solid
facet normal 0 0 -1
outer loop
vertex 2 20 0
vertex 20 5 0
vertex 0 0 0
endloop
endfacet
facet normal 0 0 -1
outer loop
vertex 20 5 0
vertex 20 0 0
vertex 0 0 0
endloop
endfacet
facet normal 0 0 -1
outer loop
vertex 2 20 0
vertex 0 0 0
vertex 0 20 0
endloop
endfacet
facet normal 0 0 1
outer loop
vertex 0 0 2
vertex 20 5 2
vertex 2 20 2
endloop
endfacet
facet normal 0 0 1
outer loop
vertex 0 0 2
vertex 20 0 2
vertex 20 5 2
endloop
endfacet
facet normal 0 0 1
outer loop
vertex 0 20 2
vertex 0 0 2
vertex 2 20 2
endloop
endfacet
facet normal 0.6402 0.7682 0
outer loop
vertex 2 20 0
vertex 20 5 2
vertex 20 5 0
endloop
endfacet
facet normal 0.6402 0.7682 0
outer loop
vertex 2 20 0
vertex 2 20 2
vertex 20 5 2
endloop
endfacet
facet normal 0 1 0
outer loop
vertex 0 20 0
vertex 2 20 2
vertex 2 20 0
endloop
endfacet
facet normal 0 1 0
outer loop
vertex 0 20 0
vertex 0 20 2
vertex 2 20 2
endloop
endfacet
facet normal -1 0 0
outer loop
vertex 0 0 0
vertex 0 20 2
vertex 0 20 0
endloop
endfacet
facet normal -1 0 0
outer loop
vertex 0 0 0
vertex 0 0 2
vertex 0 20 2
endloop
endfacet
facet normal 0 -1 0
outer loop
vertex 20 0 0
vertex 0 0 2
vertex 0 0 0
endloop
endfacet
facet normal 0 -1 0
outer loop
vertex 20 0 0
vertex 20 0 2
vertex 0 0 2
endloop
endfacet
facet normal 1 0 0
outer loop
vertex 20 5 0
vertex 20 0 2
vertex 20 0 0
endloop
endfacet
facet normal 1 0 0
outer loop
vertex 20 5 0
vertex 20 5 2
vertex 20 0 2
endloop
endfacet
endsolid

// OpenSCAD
$fn=50;

version = "1.1.0";

width = 112; // the horizontal dimension of the face (X)
height = 10; // the vertical dimension of the face (Z)
depth = 20;  // (Y)
inset = 22;
shellThickness = 2;


keyRadius = 2;
keyHeight = 4;

translate([])
topCorner();

%difference() {   
union() {
// top
translate([0,0, height - shellThickness]) 
    cube ([width, 5, shellThickness]);

// side
//translate([0,0, height-depth]) 
cube ([ shellThickness, depth, height]);

// side
translate([width-shellThickness,0, 0]) 
cube ([ shellThickness, depth, height]);

//face
rotate([90, 0,0])
translate([0, 0, -shellThickness]) 
cube ([width, height, shellThickness]);
}


translate([22, -1, keyHeight-1]) keyhole();
translate([width-22, -1, keyHeight-1]) keyhole();
versionNumber();
}


module topCorner() {
    linear_extrude(shellThickness)
    polygon (
            [
                [0,0],
                [0,depth],
                [shellThickness,depth],
                [depth, 5],
                [depth, 0]
            ]
        );
}

module versionNumber() {
    translate([width/2, 0.5,height/2])
    rotate([90,0,0])
    linear_extrude (1) {
    text(version, , 7, halign = "center", valign = "center");
    }
}

module keyhole() {

    rotate([-90, 0,0]) 
    linear_extrude(shellThickness + 2)
    union() {
    circle (r=keyRadius);
    translate([keyRadius, 0,0])
        polygon (
            [
                [0,0],
                [-(keyRadius + 1),0],
                [-keyRadius,keyHeight],
                [keyRadius,keyHeight]
            ]
        );

    translate([-keyRadius, 0,0])
        polygon ([
            [0,0],
            [(keyRadius + 1),0]    ,
            [(keyRadius + 1),keyHeight],
            [-keyRadius,keyHeight]
        ]
        );
    }

} // end keyhole module
